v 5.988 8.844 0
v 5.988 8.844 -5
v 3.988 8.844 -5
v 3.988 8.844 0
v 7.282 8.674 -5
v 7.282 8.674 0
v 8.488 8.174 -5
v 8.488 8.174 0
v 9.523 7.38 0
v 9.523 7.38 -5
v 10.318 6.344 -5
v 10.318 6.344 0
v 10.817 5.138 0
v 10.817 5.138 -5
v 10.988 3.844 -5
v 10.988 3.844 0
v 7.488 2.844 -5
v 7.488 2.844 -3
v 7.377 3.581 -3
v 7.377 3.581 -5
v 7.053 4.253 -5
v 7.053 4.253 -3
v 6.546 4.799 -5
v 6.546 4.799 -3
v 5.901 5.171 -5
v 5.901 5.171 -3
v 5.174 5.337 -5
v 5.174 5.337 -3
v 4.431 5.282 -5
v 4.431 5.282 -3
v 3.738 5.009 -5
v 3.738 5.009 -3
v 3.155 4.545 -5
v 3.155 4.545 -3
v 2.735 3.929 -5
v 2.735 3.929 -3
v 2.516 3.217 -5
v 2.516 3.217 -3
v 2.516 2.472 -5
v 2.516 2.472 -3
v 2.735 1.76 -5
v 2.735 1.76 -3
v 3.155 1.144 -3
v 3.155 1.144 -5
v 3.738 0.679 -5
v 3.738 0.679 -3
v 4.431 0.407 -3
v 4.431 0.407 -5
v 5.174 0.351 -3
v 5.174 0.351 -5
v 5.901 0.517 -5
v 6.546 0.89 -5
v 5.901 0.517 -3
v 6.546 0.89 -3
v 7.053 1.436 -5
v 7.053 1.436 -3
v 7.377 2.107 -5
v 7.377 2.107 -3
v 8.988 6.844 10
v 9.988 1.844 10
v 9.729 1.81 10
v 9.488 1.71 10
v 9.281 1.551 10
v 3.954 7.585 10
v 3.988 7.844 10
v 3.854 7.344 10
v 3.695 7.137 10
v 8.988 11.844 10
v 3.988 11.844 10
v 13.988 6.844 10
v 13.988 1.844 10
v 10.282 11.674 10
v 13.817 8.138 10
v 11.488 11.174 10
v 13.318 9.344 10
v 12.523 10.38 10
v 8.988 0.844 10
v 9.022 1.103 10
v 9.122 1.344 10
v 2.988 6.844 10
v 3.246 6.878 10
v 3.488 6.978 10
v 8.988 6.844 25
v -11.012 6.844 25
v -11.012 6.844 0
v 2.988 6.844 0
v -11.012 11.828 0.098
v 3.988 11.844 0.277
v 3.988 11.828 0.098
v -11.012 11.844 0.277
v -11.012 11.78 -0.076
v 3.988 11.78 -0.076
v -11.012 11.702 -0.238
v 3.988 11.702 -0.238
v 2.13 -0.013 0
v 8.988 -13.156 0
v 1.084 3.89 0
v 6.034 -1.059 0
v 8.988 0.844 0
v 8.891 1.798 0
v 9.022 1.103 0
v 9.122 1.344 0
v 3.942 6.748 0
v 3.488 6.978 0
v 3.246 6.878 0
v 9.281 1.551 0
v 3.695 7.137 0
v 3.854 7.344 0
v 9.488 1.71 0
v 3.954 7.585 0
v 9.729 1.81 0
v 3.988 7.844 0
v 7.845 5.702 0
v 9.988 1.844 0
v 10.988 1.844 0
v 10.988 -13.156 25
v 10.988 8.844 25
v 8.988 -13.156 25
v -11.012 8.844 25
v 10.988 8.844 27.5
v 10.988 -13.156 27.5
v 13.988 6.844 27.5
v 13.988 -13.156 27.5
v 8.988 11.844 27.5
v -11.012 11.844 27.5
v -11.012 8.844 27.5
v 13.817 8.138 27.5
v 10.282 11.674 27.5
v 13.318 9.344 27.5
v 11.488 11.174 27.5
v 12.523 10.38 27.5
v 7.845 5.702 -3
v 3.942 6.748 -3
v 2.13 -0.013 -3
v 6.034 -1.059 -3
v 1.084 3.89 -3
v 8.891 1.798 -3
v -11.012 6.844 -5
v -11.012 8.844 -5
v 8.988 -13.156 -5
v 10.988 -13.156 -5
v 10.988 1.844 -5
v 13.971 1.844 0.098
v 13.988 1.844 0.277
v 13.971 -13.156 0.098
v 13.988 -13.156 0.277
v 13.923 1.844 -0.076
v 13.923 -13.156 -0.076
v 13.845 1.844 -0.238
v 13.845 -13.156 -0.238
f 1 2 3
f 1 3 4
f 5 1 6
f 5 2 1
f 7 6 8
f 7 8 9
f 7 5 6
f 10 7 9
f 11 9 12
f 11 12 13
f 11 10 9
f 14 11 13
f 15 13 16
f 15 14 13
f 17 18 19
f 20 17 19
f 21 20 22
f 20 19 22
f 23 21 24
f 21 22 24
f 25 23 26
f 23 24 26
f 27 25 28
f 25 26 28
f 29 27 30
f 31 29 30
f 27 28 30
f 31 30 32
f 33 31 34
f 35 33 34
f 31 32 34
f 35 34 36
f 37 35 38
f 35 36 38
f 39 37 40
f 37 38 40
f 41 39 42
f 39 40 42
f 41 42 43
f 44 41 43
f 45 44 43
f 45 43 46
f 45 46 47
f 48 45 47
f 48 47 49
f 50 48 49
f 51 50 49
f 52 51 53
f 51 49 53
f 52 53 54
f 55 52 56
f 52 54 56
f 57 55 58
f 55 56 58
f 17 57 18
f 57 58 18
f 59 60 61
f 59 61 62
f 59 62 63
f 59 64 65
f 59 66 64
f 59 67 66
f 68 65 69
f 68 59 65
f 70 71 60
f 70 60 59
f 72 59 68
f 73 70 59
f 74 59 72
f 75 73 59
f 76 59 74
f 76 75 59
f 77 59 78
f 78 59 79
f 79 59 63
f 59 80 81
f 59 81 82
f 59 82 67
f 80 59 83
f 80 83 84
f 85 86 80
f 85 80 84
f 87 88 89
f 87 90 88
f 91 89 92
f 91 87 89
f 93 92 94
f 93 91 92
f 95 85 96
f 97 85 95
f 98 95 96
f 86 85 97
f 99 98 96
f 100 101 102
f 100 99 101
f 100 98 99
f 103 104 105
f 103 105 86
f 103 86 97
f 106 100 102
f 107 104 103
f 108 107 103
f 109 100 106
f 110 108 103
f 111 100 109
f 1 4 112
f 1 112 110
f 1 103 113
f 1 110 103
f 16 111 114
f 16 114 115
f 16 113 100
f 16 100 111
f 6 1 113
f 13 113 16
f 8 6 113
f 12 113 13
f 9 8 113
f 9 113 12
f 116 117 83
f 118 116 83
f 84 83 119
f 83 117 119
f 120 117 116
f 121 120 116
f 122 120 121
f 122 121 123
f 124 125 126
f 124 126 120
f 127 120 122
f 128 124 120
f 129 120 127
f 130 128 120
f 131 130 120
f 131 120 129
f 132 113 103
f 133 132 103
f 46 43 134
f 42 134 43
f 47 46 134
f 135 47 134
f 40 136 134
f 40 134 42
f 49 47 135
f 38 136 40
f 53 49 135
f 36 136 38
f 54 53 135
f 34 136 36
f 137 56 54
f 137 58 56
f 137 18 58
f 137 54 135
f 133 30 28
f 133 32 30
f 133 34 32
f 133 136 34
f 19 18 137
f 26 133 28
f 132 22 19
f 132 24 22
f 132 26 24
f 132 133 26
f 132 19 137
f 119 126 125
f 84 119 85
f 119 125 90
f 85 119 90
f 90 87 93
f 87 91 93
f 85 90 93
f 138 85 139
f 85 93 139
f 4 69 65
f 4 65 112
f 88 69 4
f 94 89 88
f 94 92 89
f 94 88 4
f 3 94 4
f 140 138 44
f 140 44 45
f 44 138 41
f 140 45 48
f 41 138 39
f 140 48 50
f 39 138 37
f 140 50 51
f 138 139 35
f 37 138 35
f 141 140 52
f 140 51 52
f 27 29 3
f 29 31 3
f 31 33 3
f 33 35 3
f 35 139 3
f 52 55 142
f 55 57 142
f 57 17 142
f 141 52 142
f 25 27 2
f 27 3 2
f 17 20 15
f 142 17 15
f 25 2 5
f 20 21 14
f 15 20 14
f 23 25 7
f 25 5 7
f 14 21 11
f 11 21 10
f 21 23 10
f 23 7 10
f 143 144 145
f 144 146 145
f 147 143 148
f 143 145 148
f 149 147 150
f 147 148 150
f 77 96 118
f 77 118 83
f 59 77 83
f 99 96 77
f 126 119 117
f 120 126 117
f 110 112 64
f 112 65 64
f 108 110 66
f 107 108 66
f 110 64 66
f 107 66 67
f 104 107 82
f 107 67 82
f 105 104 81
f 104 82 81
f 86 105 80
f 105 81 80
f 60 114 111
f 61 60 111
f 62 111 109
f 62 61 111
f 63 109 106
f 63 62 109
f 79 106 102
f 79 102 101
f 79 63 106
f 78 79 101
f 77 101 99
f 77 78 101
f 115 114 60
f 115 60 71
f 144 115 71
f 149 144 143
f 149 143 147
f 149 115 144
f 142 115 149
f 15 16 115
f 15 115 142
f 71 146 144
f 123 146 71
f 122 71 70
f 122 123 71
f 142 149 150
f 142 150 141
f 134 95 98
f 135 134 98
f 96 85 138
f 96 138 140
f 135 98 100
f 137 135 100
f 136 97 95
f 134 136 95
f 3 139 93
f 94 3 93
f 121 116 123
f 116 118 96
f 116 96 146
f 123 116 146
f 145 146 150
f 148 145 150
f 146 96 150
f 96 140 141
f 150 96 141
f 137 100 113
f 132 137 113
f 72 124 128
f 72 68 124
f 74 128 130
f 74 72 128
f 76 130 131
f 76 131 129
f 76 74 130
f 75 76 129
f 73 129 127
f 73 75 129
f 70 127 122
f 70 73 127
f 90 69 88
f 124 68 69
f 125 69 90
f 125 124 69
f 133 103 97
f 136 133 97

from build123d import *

# Parameters (mm, degrees)
BOSS_EXTRU_4_DEPTH       = 25
BOSS_EXTRU_5_DEPTH       = 2.5
BOSS_EXTRU_6_DEPTH       = 5
ESQUISSE8_W              = 10
ESQUISSE8_H              = 10
ENL_V_MAT_EXTRU_3_DEPTH  = 10
ENL_V_START              = -25
ESQUISSE14_W             = 5
ESQUISSE14_H             = 3
ENL_V_MAT_EXTRU_13_DEPTH = 25
ENL_V_START_2            = -22
ESQUISSE15_W             = 3
ESQUISSE15_H             = 5
ENL_V_MAT_EXTRU_14_DEPTH = 22
BOSS_EXTRU_8_START       = -15
BOSS_EXTRU_8_DEPTH       = 15
BOSS_EXTRU_9_DEPTH       = 15
CONG_16_R                = 5
ESQUISSE20_R             = 2.5
ENL_V_MAT_EXTRU_16_DEPTH = 2
ENL_V_MAT_EXTRU_17_DEPTH = 3
CONG_31_R                = 1
CONG_37_R                = 1


with BuildPart() as part:
    # Esquisse1 → Boss.-Extru.4 (new body)
    with BuildSketch(Plane.XY):
        Polygon((-11.012370079, 11.844262295), (13.987629921, 11.844262295), (13.987629921, -13.155737705), (8.987629921, -13.155737705), (8.987629921, 6.844262295), (-11.012370079, 6.844262295), align=None)
    extrude(amount=BOSS_EXTRU_4_DEPTH)

    # Esquisse6 → Boss.-Extru.5 (add)
    with BuildSketch(Plane.XY.offset(25)):
        Polygon((10.987629921, -13.155737705), (13.987629921, -13.155737705), (13.987629921, 11.844262295), (-11.012370079, 11.844262295), (-11.012370079, 8.844262295), (10.987629921, 8.844262295), align=None)
    extrude(amount=BOSS_EXTRU_5_DEPTH)

    # Esquisse7 → Boss.-Extru.6 (add)
    with BuildSketch(Plane(origin=(0, 0, 0), x_dir=(-1, 0, 0), z_dir=(0, 0, -1))):
        Polygon((11.012370079, 6.844262295), (-8.987629921, -13.155737705), (-13.987629921, -13.155737705), (-13.987629921, 11.844262295), (11.012370079, 11.844262295), align=None)
    extrude(amount=BOSS_EXTRU_6_DEPTH)

    # Esquisse8 → Enlèv. mat.-Extru.3 (cut)
    with BuildSketch(Plane(origin=(13.987629921, 0, 0), x_dir=(0, 0, -1), z_dir=(1, 0, 0))):
        with Locations((-5, 6.844262295)):
            Rectangle(ESQUISSE8_W, ESQUISSE8_H)
    extrude(amount=-ENL_V_MAT_EXTRU_3_DEPTH, mode=Mode.SUBTRACT)

    # Esquisse14 → Enlèv. mat.-Extru.13 (cut)
    with BuildSketch(Plane.ZY.offset(11.012370079).offset(ENL_V_START)):
        with Locations((-2.5, 10.344262295)):
            Rectangle(ESQUISSE14_W, ESQUISSE14_H)
    extrude(amount=ENL_V_MAT_EXTRU_13_DEPTH, mode=Mode.SUBTRACT)

    # Esquisse15 → Enlèv. mat.-Extru.14 (cut)
    with BuildSketch(Plane(origin=(0, -13.155737705, 0), x_dir=(-1, 0, 0), z_dir=(0, -1, 0)).offset(ENL_V_START_2)):
        with Locations((-12.487629921, 2.5)):
            Rectangle(ESQUISSE15_W, ESQUISSE15_H)
    extrude(amount=ENL_V_MAT_EXTRU_14_DEPTH, mode=Mode.SUBTRACT)

    # Esquisse16 → Boss.-Extru.8 (add)
    with BuildSketch(Plane(origin=(0, -13.155737705, 0), x_dir=(-1, 0, 0), z_dir=(0, -1, 0)).offset(BOSS_EXTRU_8_START)):
        Polygon((-10.987629921, 0), (-13.987629921, 0), (-10.987629921, 5), align=None)
    extrude(amount=BOSS_EXTRU_8_DEPTH)

    # Esquisse17 → Boss.-Extru.9 (add)
    with BuildSketch(Plane.ZY.offset(11.012370079)):
        Polygon((-5, 8.844262295), (0, 11.844262295), (0, 8.844262295), align=None)
    extrude(amount=-BOSS_EXTRU_9_DEPTH)

    # Congé16
    cong_16_edges = [part.edges().sort_by_distance(p)[0] for p in [
        (13.987629921, 11.844262295, 18.75),
        (10.987629921, 8.844262295, -2.5),
    ]]
    fillet(cong_16_edges, radius=CONG_16_R)

    # Esquisse20 → Enlèv. mat.-Extru.16 (cut)
    with BuildSketch(Plane.XY.offset(-3)):
        with Locations((4.987629921, 2.844262295)):
            Circle(ESQUISSE20_R)
    extrude(amount=-ENL_V_MAT_EXTRU_16_DEPTH, mode=Mode.SUBTRACT)

    # Esquisse18 → Enlèv. mat.-Extru.17 (cut)
    with BuildSketch(Plane.XY):
        Polygon((2.129891888, -0.013475738), (6.033634639, -1.059480456), (8.891372672, 1.798257578), (7.845367954, 5.702000328), (3.941625204, 6.748005046), (1.08388717, 3.890267013), align=None)
    extrude(amount=-ENL_V_MAT_EXTRU_17_DEPTH, mode=Mode.SUBTRACT)

    # Congé31
    cong_31_edges = [part.edges().sort_by_distance(p)[0] for p in [
        (8.987629921, 1.844262295, 5),
        (3.987629921, 6.844262295, 5),
    ]]
    fillet(cong_31_edges, radius=CONG_31_R)

    # Congé37
    cong_37_edges = [part.edges().sort_by_distance(p)[0] for p in [
        (-3.512370079, 11.844262295, 0),
        (13.987629921, -5.655737705, 0),
    ]]
    fillet(cong_37_edges, radius=CONG_37_R)


solid = part.part
